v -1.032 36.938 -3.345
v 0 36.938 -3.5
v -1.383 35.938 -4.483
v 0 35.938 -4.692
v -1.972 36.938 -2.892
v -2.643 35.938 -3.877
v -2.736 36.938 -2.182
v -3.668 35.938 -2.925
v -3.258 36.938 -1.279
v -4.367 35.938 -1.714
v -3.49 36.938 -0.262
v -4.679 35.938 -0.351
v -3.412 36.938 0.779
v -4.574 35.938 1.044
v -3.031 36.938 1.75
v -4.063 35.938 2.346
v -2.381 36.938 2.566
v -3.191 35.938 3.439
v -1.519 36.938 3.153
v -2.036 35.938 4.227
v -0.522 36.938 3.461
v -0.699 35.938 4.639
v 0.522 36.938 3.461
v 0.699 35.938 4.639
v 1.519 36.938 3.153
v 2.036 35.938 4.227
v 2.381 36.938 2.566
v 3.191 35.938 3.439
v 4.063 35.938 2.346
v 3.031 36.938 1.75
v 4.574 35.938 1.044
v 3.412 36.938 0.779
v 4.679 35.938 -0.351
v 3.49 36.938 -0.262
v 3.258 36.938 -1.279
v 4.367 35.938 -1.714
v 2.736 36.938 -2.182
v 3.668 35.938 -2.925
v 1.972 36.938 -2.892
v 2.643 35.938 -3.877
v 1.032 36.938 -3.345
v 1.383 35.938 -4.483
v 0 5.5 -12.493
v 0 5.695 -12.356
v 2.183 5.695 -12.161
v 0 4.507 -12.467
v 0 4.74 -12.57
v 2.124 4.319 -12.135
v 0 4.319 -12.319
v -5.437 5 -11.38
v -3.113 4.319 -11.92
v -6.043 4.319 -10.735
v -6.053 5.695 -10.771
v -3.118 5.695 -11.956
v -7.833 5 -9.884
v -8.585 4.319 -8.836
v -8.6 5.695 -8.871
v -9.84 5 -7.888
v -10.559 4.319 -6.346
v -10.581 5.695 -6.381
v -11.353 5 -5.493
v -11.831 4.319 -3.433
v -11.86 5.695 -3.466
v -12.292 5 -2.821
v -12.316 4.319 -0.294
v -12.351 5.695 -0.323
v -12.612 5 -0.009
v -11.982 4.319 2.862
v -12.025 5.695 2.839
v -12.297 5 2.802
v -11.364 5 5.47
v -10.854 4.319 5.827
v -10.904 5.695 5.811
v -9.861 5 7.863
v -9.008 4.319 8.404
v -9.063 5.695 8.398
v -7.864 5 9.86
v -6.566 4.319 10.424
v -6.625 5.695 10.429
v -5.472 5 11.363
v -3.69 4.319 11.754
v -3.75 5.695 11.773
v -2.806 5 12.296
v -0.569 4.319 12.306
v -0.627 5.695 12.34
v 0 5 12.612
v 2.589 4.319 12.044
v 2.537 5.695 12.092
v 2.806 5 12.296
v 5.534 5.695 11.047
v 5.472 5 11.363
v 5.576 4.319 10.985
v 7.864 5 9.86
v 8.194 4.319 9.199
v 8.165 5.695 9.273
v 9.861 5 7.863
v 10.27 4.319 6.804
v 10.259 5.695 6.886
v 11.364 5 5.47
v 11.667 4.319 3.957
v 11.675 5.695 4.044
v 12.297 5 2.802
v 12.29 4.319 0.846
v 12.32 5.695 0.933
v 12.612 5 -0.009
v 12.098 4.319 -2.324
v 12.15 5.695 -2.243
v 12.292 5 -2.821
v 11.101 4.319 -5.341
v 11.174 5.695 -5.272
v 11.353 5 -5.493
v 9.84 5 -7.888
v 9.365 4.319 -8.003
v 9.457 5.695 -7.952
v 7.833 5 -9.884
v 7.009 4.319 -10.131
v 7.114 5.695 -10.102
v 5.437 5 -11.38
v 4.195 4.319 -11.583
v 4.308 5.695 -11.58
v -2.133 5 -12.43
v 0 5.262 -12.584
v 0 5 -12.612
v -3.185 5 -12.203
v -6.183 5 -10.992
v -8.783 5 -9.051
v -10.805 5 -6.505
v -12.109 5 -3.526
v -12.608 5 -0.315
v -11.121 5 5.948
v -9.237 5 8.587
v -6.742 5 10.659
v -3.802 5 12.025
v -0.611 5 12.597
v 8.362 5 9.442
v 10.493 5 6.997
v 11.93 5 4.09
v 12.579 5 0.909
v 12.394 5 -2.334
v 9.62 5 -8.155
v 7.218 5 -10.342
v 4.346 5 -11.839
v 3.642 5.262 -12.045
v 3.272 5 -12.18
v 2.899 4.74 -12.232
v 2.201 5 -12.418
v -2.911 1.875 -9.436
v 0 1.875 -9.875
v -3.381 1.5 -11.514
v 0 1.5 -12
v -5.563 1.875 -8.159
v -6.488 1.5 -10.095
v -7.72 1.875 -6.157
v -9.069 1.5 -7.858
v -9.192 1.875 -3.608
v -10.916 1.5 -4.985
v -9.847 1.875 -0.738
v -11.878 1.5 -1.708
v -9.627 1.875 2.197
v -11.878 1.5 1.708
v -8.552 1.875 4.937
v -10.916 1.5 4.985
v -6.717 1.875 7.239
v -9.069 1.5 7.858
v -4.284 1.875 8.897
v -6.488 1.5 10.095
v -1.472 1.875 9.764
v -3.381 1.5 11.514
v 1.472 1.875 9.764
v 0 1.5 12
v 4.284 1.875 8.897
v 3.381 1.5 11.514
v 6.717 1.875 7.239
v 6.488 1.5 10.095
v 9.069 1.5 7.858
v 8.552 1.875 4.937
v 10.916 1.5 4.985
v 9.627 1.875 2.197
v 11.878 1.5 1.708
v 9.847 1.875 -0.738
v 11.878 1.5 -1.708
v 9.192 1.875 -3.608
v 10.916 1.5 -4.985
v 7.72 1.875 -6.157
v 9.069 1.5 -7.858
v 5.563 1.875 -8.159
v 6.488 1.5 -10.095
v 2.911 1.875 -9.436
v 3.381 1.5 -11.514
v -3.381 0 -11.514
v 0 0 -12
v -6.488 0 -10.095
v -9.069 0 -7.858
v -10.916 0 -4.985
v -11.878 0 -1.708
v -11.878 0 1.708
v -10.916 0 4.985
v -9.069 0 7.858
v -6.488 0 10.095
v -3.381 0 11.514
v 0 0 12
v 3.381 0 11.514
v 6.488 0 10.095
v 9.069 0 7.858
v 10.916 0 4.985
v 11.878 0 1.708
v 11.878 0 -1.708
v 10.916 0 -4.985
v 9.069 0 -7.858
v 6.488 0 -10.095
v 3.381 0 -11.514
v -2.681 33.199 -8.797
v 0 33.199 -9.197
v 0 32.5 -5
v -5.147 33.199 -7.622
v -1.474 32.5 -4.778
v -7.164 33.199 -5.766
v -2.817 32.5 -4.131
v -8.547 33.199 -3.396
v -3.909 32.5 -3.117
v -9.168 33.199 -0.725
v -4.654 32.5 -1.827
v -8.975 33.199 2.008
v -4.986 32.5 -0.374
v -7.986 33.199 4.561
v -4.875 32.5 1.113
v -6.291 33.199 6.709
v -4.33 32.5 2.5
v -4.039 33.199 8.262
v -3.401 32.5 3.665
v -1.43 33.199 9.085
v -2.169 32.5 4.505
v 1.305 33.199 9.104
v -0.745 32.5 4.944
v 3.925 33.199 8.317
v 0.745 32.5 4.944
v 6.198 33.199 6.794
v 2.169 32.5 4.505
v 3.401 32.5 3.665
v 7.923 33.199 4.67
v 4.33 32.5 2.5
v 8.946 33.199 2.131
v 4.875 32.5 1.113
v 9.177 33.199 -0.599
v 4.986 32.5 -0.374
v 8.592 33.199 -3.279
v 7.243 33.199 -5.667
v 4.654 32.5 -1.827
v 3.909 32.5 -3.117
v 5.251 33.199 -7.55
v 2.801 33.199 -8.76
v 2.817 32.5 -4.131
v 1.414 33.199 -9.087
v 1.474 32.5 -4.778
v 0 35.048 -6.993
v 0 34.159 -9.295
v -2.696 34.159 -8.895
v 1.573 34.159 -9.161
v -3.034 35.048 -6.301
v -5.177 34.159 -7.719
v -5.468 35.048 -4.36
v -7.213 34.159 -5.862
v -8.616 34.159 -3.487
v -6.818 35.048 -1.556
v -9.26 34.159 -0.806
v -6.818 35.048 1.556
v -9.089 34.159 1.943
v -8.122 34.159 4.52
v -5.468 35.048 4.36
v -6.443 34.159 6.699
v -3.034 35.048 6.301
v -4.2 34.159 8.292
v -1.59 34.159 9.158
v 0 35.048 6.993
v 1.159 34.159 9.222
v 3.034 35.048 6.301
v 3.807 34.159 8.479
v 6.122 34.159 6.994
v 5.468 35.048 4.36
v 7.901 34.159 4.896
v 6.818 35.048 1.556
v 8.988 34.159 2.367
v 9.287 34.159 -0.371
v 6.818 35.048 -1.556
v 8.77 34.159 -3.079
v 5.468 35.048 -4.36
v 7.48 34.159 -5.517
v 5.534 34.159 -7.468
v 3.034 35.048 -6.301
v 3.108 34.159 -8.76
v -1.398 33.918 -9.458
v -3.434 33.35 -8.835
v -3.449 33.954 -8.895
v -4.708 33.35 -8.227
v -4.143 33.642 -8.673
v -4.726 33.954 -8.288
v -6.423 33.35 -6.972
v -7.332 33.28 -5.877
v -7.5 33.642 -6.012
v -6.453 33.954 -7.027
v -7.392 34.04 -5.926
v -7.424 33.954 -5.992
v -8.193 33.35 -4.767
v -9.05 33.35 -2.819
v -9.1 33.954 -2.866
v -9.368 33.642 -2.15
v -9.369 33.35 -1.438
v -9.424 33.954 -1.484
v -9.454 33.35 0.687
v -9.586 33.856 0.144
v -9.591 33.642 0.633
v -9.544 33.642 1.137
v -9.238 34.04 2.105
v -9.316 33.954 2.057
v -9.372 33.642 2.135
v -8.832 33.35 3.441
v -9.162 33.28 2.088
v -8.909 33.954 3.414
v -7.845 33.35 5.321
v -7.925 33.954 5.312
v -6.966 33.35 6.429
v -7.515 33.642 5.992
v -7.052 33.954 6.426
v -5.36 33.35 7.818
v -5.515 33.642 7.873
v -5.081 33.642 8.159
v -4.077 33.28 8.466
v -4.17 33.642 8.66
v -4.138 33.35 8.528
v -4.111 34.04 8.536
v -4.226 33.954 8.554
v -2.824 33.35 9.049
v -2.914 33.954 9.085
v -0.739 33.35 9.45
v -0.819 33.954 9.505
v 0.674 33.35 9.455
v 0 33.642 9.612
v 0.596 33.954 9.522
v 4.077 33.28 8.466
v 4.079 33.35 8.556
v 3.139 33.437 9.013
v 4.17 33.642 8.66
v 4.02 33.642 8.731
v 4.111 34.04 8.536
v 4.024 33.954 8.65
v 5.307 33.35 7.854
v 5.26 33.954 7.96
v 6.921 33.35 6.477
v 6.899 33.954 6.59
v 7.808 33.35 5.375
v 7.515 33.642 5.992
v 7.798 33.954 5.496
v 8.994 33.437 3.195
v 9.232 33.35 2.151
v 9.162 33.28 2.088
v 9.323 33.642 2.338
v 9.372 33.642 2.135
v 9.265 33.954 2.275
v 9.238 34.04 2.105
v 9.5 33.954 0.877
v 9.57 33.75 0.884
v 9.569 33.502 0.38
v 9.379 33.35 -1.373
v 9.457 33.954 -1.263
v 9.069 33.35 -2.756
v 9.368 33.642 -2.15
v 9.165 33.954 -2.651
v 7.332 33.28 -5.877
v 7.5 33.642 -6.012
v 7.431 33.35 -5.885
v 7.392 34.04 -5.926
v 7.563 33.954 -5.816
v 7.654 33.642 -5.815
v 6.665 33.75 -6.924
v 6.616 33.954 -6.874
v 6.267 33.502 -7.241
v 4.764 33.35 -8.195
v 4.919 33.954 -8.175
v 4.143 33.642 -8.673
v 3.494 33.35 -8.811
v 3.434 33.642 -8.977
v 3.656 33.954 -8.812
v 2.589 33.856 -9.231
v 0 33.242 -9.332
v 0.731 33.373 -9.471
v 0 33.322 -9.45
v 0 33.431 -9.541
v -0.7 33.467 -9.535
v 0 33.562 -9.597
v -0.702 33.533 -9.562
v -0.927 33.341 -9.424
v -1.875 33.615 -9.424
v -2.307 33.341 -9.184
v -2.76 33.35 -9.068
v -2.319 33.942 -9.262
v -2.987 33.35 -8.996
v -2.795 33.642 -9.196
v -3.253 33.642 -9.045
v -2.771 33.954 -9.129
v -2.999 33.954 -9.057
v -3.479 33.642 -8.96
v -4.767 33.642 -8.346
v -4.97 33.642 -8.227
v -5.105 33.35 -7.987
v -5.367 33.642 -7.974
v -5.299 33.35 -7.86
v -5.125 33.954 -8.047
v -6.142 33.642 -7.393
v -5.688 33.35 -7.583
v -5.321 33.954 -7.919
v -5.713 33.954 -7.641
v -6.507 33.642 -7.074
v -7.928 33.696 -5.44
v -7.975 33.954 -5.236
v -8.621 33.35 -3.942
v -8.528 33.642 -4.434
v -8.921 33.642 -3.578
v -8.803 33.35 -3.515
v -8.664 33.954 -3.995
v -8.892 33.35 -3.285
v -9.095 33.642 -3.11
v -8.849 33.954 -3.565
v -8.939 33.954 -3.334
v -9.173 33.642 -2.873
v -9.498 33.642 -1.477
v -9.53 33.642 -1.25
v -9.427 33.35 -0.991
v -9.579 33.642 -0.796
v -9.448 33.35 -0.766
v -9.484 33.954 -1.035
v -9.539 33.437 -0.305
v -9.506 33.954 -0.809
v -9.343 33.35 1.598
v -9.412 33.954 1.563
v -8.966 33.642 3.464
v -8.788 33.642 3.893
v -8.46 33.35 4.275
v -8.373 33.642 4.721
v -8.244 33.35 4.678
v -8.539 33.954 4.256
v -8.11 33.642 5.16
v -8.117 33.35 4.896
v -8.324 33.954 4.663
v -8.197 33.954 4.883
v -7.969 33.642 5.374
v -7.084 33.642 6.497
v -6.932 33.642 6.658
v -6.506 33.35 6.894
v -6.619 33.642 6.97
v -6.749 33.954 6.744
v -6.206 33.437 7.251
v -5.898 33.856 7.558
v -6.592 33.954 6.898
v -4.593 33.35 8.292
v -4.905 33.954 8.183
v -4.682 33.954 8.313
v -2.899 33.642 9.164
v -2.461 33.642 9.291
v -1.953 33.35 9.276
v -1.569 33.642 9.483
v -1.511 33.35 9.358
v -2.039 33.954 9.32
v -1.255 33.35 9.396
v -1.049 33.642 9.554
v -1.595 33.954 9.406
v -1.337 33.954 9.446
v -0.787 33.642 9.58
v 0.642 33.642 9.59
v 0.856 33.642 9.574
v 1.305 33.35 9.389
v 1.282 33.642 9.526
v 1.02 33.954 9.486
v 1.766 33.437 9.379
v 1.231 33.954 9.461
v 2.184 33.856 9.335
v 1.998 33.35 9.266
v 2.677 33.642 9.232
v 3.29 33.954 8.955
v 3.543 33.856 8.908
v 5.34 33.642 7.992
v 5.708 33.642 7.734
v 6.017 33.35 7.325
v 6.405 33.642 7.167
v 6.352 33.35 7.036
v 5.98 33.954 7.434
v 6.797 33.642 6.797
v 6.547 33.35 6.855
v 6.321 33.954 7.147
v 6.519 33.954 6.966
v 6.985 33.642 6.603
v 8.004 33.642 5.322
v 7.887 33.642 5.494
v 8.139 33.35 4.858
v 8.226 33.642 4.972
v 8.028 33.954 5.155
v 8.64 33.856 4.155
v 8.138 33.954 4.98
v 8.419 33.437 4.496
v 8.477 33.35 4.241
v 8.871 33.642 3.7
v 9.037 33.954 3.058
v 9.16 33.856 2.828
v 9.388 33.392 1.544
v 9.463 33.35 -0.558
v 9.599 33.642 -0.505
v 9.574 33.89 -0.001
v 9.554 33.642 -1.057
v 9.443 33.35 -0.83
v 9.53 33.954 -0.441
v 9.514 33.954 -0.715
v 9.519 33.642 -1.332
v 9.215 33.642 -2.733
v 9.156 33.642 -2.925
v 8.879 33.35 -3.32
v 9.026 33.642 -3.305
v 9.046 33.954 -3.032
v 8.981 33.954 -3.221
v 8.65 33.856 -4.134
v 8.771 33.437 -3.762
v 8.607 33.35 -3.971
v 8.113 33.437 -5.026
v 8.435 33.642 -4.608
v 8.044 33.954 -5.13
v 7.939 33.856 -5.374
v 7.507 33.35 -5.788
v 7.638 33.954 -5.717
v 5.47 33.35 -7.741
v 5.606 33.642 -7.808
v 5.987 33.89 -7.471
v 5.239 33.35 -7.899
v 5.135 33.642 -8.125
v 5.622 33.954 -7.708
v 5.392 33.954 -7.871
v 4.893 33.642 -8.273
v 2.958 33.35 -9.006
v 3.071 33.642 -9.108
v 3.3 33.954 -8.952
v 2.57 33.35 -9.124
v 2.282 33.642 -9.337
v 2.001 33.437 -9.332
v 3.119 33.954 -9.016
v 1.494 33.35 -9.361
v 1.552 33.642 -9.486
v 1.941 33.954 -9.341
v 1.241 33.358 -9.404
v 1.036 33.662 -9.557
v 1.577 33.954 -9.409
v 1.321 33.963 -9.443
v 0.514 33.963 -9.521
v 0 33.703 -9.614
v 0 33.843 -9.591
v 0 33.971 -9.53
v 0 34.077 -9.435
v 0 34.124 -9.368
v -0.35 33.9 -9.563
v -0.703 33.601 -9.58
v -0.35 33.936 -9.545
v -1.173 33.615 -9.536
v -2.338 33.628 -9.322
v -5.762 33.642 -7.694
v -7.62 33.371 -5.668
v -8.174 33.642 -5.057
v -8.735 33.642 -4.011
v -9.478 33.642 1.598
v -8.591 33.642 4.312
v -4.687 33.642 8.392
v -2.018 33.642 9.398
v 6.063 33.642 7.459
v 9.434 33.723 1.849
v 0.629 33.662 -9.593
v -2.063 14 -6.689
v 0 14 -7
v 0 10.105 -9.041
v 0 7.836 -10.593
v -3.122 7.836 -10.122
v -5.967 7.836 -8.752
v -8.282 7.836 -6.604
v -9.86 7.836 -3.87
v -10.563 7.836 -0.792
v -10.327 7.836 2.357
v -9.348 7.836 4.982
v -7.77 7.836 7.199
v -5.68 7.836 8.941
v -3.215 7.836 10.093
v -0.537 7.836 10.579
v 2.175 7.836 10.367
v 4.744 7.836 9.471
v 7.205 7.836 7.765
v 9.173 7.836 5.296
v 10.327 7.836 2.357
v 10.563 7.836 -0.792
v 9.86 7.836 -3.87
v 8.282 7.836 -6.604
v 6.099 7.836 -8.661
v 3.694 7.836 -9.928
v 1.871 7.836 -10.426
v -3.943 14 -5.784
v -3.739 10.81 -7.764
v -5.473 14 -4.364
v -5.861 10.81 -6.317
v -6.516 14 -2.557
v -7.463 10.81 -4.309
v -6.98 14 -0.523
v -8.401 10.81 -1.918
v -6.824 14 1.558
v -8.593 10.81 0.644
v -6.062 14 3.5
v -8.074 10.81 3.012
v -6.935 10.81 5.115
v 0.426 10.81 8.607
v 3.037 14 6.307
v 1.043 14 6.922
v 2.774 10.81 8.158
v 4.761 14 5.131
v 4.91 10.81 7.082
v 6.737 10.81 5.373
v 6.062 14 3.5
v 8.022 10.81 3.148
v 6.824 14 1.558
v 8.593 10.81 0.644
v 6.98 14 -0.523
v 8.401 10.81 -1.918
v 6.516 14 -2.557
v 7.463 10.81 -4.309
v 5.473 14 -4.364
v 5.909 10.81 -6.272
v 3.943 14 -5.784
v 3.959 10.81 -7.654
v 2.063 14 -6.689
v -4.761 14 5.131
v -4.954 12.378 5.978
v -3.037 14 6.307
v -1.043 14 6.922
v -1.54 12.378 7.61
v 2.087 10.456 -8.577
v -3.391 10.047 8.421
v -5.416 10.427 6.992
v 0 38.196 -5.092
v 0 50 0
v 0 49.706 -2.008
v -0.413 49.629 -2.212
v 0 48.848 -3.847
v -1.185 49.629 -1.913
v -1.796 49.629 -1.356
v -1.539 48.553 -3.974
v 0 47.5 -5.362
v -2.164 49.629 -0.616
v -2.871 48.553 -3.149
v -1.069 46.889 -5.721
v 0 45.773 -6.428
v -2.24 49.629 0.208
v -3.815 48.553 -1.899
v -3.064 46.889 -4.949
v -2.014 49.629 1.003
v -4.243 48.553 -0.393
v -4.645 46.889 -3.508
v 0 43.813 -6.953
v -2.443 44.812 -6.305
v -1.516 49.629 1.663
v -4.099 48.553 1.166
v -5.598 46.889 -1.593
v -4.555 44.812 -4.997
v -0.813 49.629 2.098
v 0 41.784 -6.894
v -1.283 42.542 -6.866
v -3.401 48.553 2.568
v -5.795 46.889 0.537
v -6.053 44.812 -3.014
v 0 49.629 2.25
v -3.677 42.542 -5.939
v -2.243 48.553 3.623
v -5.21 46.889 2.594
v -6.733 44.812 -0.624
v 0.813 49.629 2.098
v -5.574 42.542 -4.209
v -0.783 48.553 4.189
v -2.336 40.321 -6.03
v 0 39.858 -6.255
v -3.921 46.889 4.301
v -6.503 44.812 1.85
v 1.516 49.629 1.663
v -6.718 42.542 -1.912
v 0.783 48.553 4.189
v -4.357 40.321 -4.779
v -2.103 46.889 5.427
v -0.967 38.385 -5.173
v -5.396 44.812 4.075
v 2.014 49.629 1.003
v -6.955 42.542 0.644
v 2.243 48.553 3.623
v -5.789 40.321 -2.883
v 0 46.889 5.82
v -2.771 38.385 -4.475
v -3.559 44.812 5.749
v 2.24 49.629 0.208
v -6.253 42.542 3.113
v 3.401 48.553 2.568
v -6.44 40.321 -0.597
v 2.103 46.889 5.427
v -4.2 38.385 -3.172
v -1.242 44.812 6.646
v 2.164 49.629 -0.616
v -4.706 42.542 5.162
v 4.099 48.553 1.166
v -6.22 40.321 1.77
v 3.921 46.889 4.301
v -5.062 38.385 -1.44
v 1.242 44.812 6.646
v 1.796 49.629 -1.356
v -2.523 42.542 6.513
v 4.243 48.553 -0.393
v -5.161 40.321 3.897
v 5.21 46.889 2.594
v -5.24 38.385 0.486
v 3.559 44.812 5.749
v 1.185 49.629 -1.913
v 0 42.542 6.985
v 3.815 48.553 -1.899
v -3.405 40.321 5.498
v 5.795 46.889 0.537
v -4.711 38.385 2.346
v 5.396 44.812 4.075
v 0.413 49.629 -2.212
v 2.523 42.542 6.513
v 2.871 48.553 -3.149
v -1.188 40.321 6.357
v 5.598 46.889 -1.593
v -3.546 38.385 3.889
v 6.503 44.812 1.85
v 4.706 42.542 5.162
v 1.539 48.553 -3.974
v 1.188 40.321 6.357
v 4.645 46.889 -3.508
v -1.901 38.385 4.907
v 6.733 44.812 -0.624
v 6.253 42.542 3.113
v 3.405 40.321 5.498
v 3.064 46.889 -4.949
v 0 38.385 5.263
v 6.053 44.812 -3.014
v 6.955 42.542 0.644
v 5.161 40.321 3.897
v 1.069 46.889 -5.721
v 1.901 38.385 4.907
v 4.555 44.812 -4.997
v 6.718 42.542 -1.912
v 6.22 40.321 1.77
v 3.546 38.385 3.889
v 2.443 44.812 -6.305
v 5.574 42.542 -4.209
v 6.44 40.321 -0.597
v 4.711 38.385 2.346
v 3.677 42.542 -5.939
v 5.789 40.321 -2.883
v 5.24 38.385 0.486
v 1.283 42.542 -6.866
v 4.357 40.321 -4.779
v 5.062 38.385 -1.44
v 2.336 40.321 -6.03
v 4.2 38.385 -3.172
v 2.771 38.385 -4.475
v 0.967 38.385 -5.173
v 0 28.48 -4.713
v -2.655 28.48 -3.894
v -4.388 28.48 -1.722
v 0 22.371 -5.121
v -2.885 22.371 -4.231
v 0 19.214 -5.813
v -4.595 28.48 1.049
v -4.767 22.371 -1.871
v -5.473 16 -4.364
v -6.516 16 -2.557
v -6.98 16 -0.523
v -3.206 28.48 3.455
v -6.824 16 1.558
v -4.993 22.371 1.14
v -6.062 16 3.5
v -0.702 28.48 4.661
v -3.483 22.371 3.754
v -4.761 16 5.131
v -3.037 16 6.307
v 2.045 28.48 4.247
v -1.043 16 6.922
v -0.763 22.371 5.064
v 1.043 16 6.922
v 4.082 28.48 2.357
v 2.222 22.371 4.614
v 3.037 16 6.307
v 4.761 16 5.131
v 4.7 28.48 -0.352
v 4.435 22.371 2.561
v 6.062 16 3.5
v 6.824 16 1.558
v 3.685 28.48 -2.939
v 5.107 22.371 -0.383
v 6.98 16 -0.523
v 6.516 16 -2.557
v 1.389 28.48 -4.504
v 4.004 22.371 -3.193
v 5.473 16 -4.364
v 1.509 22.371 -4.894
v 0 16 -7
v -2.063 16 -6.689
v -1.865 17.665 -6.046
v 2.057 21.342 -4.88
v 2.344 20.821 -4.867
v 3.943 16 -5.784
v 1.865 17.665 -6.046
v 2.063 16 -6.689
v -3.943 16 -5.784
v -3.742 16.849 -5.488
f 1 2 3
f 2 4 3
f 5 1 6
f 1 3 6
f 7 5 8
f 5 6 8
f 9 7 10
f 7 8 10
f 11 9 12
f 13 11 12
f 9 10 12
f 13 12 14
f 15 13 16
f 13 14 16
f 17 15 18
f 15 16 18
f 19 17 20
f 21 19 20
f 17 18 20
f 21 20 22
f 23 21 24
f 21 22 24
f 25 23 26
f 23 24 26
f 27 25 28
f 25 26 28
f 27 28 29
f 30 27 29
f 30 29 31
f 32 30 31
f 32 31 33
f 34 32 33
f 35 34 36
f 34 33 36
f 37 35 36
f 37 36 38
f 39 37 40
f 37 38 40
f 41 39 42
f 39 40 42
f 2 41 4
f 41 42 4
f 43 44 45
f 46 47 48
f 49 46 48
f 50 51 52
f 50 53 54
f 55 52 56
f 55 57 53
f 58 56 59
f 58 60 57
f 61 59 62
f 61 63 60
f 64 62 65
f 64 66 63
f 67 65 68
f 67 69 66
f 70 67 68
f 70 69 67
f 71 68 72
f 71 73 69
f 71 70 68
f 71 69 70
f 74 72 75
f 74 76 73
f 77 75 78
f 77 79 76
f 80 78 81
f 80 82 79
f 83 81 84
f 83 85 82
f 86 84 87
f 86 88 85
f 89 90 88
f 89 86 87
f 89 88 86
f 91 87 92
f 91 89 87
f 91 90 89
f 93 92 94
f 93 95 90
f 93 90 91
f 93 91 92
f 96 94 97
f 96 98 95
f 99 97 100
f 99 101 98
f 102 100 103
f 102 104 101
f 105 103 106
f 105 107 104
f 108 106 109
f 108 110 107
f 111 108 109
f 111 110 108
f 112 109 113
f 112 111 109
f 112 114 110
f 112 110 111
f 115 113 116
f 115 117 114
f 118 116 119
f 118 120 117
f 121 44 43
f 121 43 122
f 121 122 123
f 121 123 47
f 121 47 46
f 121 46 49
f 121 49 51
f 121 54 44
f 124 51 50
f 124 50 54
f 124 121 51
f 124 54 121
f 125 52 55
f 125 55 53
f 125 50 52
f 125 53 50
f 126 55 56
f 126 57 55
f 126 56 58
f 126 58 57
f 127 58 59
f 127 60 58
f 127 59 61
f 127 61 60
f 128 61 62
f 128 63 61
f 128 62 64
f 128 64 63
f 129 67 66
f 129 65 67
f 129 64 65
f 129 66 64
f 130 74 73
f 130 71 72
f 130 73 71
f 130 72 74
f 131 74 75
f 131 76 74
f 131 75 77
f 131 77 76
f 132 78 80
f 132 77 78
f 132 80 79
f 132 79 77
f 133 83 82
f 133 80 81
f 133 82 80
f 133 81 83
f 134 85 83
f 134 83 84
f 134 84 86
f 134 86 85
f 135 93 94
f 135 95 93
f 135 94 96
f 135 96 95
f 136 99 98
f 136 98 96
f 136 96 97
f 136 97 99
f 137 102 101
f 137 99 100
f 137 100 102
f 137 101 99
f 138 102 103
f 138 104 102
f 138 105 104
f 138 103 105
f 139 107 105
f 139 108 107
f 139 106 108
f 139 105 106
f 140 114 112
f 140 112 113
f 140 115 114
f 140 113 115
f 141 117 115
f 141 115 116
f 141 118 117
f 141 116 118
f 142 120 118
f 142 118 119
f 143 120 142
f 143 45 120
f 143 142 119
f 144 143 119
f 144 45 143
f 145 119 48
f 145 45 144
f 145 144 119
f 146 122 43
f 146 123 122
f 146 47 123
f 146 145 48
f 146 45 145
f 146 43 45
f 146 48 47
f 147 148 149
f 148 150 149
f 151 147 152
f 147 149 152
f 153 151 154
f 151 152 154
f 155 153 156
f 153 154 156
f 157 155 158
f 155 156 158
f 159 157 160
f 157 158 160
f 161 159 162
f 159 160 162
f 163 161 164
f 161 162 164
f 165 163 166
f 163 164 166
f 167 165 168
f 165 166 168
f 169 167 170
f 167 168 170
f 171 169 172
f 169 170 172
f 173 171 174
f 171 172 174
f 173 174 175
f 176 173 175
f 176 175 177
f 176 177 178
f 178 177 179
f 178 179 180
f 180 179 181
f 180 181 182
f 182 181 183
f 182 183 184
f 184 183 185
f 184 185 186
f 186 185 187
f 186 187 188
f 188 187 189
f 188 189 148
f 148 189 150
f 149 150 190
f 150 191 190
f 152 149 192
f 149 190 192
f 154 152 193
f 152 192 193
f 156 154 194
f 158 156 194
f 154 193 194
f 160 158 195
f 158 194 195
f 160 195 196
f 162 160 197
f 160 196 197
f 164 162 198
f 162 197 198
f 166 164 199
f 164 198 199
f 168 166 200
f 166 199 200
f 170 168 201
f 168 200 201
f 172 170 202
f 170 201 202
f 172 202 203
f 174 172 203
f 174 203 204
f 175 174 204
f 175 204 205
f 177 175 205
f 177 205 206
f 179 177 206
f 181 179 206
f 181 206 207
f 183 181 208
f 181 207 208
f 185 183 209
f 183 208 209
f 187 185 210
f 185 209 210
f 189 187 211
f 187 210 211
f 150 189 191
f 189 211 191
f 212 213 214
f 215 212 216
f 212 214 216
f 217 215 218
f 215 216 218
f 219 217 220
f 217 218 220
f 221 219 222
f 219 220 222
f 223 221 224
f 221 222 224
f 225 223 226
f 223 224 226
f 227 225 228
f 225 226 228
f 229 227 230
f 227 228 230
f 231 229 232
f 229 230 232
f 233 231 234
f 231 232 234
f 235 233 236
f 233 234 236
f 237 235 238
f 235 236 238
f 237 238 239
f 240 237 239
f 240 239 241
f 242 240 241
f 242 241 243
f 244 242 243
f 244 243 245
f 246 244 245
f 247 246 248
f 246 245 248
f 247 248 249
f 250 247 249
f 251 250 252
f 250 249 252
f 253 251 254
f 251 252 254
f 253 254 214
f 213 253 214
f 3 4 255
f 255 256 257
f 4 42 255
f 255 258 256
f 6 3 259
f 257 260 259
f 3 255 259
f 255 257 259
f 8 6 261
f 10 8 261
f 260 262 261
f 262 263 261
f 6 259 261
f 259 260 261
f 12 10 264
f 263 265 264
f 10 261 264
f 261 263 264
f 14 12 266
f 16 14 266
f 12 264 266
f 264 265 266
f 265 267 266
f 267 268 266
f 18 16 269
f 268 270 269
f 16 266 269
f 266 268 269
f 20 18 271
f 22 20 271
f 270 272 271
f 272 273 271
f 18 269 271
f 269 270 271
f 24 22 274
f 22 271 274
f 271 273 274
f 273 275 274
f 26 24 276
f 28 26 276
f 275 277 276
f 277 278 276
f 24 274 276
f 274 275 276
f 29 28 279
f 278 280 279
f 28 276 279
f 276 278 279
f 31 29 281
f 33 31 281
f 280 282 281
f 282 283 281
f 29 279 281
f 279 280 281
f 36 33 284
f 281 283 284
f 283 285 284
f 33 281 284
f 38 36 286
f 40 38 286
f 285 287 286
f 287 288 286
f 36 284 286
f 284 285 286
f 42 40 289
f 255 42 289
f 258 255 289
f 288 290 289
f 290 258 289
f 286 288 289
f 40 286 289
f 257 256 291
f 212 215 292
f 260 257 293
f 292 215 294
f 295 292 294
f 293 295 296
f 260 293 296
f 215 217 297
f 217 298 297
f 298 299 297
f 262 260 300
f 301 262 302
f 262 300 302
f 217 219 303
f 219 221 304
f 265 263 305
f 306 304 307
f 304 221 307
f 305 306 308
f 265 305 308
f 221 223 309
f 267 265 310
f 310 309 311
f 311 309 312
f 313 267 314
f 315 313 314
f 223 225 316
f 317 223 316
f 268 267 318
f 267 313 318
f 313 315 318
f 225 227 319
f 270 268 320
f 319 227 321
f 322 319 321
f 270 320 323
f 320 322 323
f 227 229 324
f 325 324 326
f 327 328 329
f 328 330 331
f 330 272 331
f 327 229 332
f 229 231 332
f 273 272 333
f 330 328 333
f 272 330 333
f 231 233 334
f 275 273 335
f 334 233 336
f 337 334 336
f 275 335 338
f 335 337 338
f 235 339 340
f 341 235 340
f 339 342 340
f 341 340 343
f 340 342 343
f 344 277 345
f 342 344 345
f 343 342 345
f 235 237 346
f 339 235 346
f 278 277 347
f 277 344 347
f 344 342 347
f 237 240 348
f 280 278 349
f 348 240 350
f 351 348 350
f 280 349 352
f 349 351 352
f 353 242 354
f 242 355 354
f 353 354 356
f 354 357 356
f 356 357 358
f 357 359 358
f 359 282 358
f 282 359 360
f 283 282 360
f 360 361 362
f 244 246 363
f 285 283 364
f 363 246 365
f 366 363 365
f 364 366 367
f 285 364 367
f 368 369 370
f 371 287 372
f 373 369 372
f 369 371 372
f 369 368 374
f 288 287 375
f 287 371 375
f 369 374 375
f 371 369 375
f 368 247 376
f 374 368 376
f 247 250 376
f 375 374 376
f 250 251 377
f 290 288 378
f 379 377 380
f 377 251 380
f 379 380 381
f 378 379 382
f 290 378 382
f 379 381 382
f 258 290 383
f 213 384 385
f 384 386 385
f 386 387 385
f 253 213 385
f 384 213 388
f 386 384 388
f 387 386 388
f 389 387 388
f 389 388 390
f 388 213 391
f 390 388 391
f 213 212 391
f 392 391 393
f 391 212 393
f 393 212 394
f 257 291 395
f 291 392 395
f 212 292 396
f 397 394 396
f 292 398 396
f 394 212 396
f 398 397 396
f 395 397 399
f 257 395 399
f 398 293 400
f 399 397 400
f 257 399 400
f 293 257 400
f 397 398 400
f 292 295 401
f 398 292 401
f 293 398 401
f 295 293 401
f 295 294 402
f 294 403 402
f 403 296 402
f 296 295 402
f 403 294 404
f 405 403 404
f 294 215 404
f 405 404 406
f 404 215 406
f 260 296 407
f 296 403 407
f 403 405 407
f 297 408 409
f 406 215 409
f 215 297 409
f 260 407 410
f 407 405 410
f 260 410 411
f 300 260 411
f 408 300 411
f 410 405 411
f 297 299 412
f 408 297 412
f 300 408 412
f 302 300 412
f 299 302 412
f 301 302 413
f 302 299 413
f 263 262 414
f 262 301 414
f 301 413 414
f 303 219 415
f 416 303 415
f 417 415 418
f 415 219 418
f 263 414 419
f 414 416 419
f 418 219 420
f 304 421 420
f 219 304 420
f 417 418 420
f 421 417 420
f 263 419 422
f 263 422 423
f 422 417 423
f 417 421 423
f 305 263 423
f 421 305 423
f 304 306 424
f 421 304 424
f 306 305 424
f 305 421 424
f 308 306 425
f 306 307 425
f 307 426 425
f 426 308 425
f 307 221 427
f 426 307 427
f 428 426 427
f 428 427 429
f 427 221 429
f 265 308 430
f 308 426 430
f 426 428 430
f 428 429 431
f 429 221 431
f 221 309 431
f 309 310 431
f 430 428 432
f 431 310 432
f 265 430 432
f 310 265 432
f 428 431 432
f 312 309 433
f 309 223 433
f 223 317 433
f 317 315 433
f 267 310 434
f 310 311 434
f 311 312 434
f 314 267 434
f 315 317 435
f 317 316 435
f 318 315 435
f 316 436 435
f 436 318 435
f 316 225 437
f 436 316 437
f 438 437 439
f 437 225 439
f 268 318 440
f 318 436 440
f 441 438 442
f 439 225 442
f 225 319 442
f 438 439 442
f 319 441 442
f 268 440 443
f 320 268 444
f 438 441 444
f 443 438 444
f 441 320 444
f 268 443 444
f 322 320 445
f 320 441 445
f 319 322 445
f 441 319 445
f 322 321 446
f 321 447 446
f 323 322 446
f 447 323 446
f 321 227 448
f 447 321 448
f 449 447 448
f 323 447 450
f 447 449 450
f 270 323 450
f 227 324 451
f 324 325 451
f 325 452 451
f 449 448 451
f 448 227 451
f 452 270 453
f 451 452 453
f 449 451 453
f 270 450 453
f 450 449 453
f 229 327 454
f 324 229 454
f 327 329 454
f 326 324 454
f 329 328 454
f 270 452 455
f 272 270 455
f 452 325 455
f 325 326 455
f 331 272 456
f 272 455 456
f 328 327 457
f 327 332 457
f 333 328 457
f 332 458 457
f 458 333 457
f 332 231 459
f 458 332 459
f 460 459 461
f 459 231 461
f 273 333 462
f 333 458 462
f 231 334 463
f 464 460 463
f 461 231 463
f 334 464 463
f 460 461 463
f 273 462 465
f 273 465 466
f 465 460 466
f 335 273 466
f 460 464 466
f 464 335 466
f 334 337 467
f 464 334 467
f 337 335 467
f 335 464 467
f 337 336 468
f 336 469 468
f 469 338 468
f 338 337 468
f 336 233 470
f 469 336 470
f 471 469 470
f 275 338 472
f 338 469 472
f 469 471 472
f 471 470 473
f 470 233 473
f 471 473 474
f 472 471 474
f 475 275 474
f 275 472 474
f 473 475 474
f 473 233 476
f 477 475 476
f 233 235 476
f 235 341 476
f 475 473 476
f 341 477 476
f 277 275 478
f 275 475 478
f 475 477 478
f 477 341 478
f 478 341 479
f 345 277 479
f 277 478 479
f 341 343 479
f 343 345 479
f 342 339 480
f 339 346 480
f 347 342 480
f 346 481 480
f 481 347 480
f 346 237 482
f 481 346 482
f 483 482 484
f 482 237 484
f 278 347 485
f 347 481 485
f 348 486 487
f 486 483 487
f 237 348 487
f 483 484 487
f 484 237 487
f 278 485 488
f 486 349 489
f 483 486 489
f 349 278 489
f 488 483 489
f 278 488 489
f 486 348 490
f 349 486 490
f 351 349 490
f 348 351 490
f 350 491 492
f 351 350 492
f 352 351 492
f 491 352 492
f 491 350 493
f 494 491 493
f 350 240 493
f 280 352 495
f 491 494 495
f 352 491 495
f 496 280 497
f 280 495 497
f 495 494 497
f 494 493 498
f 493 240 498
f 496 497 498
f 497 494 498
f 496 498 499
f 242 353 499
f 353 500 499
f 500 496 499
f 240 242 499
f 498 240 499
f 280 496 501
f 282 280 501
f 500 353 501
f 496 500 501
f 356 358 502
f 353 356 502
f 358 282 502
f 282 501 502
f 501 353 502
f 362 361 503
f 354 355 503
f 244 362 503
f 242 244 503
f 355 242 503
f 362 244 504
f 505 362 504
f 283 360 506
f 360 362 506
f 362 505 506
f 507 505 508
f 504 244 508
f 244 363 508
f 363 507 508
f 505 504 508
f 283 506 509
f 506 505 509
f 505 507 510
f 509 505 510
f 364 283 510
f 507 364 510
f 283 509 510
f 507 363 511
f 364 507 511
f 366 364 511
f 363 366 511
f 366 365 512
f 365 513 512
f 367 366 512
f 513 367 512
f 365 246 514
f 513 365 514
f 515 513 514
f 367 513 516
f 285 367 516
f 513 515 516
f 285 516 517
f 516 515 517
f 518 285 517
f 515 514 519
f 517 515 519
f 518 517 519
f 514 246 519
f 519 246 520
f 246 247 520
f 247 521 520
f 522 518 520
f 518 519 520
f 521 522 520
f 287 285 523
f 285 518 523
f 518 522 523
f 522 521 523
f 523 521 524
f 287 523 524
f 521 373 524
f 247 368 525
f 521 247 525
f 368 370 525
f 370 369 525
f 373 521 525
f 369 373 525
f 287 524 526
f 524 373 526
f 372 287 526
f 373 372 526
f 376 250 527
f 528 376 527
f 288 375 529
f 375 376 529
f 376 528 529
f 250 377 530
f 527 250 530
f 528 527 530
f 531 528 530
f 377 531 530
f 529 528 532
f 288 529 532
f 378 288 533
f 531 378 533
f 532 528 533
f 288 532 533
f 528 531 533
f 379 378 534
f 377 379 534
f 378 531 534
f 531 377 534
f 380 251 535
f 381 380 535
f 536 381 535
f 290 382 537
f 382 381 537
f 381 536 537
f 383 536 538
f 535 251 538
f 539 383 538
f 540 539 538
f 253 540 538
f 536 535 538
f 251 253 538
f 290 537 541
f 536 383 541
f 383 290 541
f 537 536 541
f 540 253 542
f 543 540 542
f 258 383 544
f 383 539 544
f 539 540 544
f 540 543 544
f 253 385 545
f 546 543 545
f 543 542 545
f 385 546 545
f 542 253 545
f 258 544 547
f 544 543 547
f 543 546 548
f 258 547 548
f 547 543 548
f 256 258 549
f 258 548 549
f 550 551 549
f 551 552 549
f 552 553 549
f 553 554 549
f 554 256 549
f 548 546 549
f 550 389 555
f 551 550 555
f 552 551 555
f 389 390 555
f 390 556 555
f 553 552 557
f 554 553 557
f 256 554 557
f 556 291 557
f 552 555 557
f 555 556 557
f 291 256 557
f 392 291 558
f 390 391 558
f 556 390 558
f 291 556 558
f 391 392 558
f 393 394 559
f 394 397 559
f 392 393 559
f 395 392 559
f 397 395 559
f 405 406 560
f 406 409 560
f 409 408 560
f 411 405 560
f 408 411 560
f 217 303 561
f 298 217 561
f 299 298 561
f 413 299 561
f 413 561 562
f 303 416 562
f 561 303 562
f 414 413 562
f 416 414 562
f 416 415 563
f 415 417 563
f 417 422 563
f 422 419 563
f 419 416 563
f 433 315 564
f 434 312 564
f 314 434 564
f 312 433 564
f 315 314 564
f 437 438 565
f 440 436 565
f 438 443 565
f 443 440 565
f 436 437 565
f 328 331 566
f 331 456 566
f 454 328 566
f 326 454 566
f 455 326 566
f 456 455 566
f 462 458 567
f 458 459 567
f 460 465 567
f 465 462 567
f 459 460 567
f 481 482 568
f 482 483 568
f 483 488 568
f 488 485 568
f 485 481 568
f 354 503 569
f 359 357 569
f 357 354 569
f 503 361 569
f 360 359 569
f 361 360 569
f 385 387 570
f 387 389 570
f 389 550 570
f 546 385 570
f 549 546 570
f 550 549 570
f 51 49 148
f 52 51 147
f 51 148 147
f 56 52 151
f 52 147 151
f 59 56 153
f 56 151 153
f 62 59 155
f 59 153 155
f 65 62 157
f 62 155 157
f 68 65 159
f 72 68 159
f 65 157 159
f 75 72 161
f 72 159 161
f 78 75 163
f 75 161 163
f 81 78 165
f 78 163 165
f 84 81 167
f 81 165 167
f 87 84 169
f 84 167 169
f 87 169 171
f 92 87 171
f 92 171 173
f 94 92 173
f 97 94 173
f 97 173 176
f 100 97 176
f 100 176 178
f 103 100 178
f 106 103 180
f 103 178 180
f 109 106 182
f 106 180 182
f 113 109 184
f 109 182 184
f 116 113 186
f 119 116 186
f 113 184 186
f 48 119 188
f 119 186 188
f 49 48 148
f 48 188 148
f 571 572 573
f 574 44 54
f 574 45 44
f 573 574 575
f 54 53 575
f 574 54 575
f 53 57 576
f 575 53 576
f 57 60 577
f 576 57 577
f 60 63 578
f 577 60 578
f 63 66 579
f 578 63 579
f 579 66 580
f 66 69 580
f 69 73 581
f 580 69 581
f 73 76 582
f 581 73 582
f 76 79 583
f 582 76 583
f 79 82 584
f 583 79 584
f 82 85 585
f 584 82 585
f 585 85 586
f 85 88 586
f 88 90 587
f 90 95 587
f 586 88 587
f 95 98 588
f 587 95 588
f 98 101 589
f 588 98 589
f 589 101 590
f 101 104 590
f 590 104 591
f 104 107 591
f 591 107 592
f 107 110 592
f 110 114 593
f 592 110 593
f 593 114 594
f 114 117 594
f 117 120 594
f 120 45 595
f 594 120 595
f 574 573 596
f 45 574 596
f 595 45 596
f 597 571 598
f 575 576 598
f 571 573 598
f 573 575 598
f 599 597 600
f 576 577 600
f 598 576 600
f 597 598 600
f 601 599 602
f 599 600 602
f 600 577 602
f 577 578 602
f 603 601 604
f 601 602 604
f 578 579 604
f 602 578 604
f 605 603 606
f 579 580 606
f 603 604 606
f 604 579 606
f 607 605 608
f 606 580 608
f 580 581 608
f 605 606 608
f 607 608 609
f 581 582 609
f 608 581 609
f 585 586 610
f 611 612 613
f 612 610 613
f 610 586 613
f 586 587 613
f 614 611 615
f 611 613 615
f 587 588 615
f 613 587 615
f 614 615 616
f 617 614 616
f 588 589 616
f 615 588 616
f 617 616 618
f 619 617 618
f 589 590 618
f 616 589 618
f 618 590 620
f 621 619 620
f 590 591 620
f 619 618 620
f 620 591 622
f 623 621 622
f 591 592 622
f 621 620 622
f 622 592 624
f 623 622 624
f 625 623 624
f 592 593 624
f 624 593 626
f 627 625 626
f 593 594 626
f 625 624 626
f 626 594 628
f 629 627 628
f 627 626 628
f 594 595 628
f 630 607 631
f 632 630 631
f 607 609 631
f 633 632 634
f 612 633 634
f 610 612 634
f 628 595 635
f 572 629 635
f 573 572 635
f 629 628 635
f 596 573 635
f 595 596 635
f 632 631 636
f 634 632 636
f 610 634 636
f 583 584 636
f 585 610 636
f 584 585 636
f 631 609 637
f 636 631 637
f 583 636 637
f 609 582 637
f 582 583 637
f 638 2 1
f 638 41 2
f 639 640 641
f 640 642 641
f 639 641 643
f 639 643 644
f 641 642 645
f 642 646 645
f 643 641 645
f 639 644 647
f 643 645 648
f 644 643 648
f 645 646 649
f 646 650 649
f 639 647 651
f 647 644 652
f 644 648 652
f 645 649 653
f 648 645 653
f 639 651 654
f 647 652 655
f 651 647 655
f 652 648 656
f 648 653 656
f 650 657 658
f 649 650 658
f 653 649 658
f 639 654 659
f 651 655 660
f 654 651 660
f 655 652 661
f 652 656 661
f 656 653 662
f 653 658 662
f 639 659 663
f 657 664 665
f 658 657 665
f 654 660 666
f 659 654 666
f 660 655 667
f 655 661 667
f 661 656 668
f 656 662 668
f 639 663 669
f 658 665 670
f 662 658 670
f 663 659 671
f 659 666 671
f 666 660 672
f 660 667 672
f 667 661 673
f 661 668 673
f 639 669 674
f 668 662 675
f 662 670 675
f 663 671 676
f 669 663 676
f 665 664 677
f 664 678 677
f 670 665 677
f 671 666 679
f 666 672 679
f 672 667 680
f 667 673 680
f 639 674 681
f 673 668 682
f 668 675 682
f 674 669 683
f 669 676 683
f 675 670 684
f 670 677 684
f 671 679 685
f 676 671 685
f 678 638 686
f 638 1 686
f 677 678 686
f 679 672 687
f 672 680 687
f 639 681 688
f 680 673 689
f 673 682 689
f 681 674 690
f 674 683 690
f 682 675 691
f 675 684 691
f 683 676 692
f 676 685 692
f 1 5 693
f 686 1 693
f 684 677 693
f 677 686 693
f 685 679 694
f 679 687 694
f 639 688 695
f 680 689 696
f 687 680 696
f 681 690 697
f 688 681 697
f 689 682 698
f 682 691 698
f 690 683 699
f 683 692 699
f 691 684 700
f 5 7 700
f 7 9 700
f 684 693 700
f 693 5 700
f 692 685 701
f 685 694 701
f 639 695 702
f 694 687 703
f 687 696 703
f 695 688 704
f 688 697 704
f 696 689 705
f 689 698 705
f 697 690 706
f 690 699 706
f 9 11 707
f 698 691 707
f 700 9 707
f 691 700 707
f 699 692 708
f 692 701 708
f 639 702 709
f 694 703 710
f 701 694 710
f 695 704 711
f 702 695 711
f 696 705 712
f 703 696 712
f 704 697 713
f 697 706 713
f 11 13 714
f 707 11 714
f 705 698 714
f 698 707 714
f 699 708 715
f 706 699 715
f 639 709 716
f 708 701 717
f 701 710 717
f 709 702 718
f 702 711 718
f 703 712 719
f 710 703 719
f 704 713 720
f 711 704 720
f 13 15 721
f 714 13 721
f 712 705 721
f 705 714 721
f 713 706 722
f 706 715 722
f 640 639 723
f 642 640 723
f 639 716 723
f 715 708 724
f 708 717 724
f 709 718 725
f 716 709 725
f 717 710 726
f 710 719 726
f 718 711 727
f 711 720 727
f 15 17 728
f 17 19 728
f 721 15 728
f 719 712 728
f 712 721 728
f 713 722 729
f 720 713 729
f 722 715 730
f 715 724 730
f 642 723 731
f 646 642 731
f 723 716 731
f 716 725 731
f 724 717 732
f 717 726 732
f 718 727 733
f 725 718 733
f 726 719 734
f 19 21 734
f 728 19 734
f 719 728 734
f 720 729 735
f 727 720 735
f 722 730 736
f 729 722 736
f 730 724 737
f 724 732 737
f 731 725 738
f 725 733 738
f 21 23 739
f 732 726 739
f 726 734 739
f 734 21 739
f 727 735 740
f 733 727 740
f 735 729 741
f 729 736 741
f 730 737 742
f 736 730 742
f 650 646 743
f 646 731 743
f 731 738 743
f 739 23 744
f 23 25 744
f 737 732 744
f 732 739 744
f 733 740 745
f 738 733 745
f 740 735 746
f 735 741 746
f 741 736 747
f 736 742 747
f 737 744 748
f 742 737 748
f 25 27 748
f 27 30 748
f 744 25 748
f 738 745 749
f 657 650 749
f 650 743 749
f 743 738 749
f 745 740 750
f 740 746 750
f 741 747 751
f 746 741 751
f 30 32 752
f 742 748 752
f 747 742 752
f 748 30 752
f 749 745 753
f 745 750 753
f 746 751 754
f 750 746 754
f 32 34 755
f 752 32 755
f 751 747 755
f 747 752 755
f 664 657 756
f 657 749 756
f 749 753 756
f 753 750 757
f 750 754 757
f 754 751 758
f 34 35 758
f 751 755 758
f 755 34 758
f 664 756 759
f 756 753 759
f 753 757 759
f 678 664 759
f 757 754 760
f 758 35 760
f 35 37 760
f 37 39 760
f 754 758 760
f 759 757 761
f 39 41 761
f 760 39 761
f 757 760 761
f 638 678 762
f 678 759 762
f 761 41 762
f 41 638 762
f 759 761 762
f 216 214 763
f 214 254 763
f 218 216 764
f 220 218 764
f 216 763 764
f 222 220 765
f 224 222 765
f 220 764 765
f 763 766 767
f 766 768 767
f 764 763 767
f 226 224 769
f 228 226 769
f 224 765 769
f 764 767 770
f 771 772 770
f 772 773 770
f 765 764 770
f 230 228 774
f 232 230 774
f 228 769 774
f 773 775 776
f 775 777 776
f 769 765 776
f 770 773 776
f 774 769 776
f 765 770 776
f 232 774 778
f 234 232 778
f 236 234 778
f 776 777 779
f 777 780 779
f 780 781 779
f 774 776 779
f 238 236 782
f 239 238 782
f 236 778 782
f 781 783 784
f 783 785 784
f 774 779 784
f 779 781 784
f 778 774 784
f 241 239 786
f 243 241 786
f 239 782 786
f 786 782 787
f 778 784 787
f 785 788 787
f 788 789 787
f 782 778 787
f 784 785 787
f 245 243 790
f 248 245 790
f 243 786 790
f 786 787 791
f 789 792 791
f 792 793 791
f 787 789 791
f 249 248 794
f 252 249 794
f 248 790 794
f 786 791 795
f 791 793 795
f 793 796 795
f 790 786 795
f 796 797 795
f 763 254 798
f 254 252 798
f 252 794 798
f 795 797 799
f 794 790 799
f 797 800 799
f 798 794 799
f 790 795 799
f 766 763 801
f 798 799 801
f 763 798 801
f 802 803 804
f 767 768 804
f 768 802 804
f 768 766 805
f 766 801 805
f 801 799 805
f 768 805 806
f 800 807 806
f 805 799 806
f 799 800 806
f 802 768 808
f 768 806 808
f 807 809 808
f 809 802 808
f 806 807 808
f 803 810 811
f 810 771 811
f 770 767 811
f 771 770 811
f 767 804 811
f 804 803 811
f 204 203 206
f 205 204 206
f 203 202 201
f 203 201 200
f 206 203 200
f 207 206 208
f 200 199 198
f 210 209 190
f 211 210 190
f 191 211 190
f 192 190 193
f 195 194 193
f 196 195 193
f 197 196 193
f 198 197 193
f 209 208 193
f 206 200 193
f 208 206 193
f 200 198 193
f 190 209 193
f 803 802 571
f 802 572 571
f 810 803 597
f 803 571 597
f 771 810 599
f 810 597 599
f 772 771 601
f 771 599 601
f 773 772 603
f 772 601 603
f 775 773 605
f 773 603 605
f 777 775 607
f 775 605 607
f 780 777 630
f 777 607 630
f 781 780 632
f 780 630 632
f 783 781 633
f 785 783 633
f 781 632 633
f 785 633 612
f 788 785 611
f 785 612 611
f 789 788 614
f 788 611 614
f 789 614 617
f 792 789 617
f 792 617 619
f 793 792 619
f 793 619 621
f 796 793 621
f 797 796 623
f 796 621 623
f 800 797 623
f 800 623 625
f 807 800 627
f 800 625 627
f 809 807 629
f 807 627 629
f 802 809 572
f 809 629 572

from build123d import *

# Parameters (mm, degrees)
FILLET1_R = 1
FILLET2_R = 0.5


with BuildPart() as part:
    # Sketch6 → Revolve1 (revolve)
    with BuildSketch(Plane.XY, mode=Mode.PRIVATE) as revolve1_sk:
        with BuildLine():
            Line((0, 0), (0, 50))
            ThreePointArc((0, 50), (6.761480784, 44.811733316), (3.5, 36.937822174))
            Line((3.5, 36.937822174), (4.691753593, 35.937822174))
            Line((4.691753593, 35.937822174), (11, 33.5))
            Line((11, 33.5), (5, 32.5))
            add(Edge.make_bspline(
                [(5, 32.5), (4.632564302, 30.36024899), (4.760089012, 24.410473988), (5.30369794, 19.869322034), (7, 16)],
                knots=[0, 0, 0, 0, 0.393038289, 1, 1, 1, 1], degree=3))
            Line((7, 16), (7, 14))
            add(Edge.make_bspline(
                [(7, 14), (9.178761671, 9.005043315), (13, 5)],
                knots=[0, 0, 0, 1, 1, 1], degree=2))
            Line((13, 5), (9.874740577, 1.874740577))
            Line((9.874740577, 1.874740577), (12, 1.5))
            Line((12, 1.5), (12, 0))
            Line((12, 0), (0, 0))
        make_face()
    revolve(revolve1_sk.sketch.rotate(Axis((0, 0, 0), (0, 1, 0)), 90), axis=Axis((0, 0, 0), (0, 1, 0)))

    # Fillet1
    fillet1_edges = [part.edges().sort_by_distance(p)[0] for p in [
        (0, 5, 13),
    ]]
    fillet(fillet1_edges, radius=FILLET1_R)

    # Fillet2
    fillet2_edges = [part.edges().sort_by_distance(p)[0] for p in [
        (0, 33.5, 11),
    ]]
    fillet(fillet2_edges, radius=FILLET2_R)


solid = part.part
